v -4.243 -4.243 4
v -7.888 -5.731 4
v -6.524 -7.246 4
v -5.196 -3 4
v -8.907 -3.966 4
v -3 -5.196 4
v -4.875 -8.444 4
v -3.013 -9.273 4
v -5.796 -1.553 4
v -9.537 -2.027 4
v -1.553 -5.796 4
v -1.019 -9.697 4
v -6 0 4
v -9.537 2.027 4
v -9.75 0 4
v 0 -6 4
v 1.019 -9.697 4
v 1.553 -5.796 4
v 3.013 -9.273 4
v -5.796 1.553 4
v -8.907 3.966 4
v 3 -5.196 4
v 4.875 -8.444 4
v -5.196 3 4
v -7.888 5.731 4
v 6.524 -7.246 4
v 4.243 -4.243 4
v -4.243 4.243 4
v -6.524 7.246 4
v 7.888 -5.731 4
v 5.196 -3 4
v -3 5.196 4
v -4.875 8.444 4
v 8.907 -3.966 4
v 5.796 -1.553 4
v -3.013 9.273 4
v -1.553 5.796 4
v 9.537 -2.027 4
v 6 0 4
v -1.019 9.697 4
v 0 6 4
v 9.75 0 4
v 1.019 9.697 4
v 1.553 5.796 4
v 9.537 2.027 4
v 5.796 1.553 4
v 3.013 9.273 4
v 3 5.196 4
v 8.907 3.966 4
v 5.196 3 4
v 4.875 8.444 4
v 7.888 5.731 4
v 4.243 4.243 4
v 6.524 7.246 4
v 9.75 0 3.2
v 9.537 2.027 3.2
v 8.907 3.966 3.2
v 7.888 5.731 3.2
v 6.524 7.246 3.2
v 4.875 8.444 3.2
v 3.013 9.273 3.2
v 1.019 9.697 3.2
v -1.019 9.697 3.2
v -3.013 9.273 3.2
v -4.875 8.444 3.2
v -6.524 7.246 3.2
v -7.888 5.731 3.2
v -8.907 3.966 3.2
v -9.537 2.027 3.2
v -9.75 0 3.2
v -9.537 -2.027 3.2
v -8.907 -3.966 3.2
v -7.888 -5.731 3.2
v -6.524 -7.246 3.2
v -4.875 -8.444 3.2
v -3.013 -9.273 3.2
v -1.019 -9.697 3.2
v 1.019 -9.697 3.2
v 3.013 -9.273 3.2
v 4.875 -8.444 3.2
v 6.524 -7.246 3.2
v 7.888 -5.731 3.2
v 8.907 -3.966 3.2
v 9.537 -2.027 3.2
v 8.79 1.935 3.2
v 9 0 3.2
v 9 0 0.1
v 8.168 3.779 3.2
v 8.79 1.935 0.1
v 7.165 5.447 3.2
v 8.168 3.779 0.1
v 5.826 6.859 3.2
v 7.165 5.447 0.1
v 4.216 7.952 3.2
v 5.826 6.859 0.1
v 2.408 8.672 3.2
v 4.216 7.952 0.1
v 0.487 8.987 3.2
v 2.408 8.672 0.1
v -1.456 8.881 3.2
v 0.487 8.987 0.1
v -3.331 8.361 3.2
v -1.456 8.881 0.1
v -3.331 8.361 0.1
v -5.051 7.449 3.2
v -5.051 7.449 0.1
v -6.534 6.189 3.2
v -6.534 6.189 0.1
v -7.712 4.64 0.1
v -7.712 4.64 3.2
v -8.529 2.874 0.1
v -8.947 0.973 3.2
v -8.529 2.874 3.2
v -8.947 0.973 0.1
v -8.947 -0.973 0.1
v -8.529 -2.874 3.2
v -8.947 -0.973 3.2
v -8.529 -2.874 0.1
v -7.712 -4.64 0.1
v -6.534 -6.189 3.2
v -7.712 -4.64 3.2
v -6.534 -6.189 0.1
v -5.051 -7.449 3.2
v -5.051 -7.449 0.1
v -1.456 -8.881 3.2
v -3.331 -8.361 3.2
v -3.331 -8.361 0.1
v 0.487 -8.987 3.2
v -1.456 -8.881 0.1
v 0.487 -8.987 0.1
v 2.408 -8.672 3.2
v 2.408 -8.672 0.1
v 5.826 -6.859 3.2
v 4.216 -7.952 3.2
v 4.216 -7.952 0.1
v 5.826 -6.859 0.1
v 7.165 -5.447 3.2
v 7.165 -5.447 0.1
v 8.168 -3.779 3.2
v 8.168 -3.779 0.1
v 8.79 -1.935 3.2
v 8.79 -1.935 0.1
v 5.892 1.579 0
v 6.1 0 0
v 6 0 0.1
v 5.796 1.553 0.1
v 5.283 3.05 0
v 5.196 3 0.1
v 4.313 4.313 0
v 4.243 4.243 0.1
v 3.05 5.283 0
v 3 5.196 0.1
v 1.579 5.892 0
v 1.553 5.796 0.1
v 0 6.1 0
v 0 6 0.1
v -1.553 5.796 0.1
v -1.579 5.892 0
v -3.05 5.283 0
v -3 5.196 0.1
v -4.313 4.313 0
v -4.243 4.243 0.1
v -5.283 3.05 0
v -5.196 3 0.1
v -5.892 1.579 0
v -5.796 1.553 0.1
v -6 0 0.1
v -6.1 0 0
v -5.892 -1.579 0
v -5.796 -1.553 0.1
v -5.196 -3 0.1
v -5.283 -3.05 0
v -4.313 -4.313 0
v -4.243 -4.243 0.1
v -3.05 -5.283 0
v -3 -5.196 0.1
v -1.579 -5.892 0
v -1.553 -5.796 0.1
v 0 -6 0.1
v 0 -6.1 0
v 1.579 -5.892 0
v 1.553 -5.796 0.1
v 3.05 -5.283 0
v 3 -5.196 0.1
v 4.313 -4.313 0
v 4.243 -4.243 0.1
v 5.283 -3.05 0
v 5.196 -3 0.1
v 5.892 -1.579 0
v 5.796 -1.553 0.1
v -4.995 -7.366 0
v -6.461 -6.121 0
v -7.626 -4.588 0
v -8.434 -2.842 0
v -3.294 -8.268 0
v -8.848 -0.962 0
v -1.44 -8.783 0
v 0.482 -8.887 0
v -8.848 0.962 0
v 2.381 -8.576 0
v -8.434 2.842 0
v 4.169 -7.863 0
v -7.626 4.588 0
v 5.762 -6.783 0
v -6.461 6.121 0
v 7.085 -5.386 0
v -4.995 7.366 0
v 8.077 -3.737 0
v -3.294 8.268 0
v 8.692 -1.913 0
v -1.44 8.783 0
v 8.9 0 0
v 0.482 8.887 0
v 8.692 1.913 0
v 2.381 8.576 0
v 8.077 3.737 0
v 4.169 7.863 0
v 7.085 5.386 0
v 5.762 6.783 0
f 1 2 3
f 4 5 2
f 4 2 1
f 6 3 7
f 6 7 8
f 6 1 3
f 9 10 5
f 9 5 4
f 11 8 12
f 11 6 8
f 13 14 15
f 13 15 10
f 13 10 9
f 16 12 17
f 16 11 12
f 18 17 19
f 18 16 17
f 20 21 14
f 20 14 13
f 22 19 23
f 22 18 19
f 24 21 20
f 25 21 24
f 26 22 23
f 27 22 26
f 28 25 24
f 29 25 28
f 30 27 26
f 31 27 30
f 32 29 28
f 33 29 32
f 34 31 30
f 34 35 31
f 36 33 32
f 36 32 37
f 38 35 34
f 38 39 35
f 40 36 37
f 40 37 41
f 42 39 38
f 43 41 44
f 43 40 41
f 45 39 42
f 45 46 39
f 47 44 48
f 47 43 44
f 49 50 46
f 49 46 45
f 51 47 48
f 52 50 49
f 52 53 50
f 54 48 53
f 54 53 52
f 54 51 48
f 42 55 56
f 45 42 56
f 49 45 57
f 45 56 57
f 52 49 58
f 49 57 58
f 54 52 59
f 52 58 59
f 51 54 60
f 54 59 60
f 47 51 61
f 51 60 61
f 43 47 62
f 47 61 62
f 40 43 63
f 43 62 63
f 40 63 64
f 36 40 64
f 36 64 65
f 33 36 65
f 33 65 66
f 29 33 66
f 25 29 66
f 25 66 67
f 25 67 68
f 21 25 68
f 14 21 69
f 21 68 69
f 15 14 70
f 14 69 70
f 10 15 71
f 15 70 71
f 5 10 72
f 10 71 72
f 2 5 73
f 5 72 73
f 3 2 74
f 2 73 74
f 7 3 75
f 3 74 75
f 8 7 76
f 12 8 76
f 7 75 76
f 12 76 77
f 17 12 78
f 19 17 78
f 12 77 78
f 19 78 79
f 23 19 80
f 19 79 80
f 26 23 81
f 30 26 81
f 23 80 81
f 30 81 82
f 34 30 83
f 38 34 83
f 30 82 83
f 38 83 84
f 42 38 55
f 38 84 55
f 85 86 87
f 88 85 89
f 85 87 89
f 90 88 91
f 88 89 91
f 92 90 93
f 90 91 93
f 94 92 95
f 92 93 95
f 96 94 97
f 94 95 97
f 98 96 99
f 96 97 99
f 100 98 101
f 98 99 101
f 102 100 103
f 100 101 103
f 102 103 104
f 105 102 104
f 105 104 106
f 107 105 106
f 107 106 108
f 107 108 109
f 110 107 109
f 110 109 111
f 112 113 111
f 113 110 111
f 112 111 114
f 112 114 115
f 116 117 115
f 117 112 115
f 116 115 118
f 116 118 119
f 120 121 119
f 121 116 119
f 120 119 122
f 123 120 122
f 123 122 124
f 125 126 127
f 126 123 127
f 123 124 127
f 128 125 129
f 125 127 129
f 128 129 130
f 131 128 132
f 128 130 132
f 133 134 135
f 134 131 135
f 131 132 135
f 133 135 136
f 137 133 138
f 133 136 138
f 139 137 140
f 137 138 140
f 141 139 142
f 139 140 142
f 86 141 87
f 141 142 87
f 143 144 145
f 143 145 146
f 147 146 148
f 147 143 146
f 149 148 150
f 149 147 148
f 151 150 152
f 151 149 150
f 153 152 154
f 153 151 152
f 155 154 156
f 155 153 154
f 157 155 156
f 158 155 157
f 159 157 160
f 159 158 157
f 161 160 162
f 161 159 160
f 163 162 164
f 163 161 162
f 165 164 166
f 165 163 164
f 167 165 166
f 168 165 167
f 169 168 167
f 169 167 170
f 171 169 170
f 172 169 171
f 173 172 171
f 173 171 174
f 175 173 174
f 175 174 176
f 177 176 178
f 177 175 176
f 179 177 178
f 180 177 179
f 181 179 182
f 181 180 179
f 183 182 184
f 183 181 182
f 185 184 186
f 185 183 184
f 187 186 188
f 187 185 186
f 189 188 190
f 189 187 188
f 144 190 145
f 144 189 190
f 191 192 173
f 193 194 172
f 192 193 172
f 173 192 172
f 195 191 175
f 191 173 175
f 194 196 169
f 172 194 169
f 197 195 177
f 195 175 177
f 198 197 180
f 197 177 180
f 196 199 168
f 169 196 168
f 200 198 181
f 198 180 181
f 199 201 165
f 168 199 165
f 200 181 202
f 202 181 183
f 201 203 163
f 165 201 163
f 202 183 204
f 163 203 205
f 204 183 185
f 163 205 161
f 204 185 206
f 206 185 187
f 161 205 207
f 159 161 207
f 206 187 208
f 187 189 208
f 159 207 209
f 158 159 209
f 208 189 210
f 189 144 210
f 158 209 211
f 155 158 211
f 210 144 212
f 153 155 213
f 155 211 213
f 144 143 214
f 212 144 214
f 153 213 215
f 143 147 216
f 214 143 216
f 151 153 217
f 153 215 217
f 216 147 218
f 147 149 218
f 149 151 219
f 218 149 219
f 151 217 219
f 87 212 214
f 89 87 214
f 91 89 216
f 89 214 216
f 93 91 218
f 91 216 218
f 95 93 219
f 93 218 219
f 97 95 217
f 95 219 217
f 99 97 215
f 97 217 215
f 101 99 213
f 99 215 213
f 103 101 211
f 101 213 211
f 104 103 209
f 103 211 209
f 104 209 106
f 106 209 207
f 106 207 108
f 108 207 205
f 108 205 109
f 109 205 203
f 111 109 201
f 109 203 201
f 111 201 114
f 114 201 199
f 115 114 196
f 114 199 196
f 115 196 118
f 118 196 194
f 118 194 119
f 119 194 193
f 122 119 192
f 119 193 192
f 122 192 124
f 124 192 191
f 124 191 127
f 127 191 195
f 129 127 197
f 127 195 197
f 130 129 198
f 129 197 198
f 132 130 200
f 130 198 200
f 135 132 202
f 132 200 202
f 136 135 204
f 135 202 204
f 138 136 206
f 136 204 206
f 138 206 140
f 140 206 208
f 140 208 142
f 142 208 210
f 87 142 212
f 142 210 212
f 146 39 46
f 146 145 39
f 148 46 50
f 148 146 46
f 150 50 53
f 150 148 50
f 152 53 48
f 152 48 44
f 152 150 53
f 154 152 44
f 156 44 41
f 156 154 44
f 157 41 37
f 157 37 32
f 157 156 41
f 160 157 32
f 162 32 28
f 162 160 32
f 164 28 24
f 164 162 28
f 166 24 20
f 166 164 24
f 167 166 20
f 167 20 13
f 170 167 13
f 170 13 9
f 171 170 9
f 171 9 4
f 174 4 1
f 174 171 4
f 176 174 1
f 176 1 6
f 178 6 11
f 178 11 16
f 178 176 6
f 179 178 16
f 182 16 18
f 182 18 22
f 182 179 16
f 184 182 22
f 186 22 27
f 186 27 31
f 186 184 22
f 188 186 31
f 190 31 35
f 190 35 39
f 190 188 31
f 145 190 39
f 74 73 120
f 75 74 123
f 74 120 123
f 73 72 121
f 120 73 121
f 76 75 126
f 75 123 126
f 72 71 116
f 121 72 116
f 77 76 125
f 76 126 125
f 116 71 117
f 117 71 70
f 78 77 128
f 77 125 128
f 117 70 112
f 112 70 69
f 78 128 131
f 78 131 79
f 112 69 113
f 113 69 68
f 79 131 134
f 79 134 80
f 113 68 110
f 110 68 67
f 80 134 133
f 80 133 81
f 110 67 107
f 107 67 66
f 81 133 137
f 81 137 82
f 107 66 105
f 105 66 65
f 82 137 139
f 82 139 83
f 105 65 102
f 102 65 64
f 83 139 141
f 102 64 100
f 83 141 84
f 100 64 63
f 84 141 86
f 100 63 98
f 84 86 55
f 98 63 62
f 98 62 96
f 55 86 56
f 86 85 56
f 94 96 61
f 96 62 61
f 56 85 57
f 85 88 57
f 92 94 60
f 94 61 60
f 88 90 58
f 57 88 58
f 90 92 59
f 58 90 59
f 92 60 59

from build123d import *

# Parameters (mm, degrees)
SKETCH_1_R      = 9
SKETCH_1_R_2    = 6
EXTRUDE_1_DEPTH = 4
CHAMFER_1_SIZE  = 0.1
EXTRUDE_START   = -0.8
SKETCH_2_R      = 9.75
SKETCH_2_R_2    = 6
EXTRUDE_2_DEPTH = 0.8


with BuildPart() as part:
    # 草图1 → 凸台-拉伸1 (new body)
    with BuildSketch(Plane.XY):
        Circle(SKETCH_1_R)
        Circle(SKETCH_1_R_2, mode=Mode.SUBTRACT)
    extrude(amount=EXTRUDE_1_DEPTH)

    # 倒角1
    chamfer_1_edges = [part.edges().sort_by_distance(p)[0] for p in [
        (-9, 0, 0),
        (-6, 0, 0),
    ]]
    chamfer(chamfer_1_edges, length=CHAMFER_1_SIZE)

    # 草图2 → 凸台-拉伸2 (add)
    with BuildSketch(Plane.XY.offset(4).offset(EXTRUDE_START)):
        Circle(SKETCH_2_R)
        Circle(SKETCH_2_R_2, mode=Mode.SUBTRACT)
    extrude(amount=EXTRUDE_2_DEPTH)


solid = part.part
